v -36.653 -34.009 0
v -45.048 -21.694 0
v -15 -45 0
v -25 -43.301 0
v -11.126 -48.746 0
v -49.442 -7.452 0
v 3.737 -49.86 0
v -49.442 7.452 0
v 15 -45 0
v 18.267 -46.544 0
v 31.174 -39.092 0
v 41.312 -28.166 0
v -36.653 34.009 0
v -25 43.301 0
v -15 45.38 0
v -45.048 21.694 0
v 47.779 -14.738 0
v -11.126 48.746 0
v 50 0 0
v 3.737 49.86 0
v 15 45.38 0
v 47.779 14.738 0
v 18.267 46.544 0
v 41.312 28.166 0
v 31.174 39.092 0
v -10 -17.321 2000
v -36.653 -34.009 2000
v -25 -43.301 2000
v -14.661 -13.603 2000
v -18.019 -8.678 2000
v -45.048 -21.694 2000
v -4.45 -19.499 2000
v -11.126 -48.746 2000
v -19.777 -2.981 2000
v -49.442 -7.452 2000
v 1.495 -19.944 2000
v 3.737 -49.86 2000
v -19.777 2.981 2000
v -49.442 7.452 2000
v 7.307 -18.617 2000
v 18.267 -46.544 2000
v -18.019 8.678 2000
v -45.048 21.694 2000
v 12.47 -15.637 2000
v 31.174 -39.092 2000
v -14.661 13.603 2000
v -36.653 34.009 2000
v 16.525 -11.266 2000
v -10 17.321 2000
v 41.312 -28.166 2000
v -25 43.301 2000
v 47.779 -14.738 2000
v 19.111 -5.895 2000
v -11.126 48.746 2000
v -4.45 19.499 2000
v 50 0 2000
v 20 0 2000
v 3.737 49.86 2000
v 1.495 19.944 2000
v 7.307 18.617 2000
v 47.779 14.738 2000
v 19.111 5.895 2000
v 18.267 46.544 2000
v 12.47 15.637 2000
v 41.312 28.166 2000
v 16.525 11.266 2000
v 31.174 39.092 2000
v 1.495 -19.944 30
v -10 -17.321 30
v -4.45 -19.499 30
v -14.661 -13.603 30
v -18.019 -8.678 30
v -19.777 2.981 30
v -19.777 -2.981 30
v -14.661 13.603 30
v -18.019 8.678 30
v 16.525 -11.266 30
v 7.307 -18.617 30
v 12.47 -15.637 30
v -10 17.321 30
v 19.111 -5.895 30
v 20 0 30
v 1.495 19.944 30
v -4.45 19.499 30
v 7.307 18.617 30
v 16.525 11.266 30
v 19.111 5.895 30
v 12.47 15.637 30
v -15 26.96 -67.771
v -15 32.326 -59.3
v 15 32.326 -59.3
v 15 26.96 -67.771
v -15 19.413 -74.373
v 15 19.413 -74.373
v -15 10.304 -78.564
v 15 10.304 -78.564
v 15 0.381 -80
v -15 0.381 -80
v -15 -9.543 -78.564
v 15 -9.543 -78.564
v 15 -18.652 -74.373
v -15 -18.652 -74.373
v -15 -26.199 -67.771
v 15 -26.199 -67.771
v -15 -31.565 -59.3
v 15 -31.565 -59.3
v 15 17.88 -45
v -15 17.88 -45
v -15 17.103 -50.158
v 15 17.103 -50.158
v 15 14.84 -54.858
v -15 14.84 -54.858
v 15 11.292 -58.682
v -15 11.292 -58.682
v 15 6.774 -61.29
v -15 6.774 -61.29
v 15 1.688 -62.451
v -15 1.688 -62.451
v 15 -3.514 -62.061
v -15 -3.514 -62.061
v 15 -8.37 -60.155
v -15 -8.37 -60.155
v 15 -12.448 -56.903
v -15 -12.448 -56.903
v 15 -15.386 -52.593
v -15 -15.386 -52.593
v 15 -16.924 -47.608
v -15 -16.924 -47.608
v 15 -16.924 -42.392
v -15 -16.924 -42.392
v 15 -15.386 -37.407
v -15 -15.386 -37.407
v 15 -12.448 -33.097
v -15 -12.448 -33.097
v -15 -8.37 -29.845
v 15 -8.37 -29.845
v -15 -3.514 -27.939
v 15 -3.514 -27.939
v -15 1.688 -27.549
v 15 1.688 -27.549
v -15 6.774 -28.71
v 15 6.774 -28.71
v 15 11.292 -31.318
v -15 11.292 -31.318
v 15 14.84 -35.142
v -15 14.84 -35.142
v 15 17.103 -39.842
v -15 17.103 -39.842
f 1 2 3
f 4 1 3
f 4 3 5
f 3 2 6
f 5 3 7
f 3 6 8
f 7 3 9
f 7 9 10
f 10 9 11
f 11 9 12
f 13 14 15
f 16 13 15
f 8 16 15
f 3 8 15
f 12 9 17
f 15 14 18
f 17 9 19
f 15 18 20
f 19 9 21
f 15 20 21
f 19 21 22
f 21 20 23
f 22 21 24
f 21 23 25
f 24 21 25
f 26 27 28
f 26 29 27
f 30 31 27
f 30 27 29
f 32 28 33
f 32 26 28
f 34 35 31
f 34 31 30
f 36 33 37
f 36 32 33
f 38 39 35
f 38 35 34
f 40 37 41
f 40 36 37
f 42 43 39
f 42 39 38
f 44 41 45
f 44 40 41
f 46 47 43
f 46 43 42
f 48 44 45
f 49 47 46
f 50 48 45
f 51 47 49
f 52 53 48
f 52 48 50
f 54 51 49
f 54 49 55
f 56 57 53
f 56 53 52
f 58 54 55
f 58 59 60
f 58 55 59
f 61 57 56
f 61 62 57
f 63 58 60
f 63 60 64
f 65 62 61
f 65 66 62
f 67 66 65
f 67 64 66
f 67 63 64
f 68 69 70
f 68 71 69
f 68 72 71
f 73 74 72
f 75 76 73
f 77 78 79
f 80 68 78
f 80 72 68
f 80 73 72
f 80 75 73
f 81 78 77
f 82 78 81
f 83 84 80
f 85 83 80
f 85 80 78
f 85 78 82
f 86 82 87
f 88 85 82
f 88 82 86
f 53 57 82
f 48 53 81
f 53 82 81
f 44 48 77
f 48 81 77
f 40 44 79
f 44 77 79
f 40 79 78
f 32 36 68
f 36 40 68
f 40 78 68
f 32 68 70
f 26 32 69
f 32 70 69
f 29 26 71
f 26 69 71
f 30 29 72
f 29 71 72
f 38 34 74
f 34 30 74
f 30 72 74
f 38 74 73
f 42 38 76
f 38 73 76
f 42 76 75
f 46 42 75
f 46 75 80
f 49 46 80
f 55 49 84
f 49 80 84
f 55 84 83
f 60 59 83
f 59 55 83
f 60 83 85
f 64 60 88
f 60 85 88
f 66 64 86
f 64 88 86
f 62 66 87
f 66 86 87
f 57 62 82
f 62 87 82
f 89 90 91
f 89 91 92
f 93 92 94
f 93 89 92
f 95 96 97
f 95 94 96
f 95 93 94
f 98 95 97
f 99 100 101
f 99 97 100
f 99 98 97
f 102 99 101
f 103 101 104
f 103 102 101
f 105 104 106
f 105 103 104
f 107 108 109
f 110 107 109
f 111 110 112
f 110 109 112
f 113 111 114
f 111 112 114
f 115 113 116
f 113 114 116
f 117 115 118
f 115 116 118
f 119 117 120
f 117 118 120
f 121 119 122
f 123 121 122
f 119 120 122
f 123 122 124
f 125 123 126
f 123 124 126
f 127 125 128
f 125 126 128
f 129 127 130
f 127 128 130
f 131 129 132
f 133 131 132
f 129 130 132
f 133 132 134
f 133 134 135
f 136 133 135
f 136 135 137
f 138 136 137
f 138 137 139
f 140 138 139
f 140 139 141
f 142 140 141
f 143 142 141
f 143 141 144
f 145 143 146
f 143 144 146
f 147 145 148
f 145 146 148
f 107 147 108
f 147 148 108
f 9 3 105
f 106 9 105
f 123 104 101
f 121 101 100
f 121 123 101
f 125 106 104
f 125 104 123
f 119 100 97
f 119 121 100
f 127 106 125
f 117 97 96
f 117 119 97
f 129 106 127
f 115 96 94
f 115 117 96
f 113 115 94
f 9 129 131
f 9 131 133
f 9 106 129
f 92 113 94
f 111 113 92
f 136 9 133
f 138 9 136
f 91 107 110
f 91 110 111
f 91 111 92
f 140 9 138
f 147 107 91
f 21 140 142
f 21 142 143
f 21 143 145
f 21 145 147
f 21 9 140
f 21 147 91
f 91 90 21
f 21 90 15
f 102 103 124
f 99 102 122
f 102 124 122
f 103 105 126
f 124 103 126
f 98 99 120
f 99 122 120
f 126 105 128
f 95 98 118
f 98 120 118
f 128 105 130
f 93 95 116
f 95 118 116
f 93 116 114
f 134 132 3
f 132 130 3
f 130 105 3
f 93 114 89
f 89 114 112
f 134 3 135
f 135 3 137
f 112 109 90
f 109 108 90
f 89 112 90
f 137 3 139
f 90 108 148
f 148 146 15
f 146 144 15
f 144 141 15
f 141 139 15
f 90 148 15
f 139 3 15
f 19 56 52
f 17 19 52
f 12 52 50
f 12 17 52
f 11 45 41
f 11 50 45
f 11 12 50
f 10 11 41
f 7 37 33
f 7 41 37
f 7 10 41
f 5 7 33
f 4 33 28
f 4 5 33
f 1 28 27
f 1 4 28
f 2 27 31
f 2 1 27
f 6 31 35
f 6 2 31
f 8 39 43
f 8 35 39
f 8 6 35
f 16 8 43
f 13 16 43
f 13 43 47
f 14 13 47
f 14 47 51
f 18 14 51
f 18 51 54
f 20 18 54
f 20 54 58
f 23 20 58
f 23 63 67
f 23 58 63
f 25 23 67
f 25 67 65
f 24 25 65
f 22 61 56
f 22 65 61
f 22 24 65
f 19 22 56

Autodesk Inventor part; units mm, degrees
ref_plane "YZ Plane" through (0, 0, 0) normal (1, 0, 0) x (0, 1, 0)
ref_plane "XZ Plane" through (0, 0, 0) normal (0, 1, 0) x (-1, 0, 0)
ref_plane "XY Plane" through (0, 0, 0) normal (0, 0, 1) x (1, 0, 0)
sketch "Sketch1" plane through (0, 0, 0) normal (0, 0, 1) x (1, 0, 0)
  circle A0 centre (0, 0) radius 50
  dimension "d0" = 100
extrude "Extrusion1" add sketch "Sketch1" along normal blind 2000
sketch "Sketch2" plane through (0, 0, 0) normal (1, 0, 0) x (0, 1, 0)
  line L0 (50, 0) -> (-50, 0) projected
  arc A0 (-31.5648, -59.3002) -> (32.3259, -59.3002) centre (0.3805, -45) ccw
  line L1 (32.3259, -59.3002) -> (45.3805, 0)
  circle A1 centre (0.3805, -45) radius 17.5
  line L2 (-45, 0) -> (-31.5648, -59.3002)
  point P0 (0, 0)
  point P1 (0, 0)
  dimension "d3" = 35
  dimension "d4" = 35
  dimension "d5" = 45
  dimension "d6" = 45
  dimension "d7" = 45
extrude "Extrusion2" add sketch "Sketch2" along normal mid plane 30
shell "Shell1" thickness 30 removed faces 1 at (9.39, -8.8667, 2000)
properties part number "Parth_Cylinder2"
